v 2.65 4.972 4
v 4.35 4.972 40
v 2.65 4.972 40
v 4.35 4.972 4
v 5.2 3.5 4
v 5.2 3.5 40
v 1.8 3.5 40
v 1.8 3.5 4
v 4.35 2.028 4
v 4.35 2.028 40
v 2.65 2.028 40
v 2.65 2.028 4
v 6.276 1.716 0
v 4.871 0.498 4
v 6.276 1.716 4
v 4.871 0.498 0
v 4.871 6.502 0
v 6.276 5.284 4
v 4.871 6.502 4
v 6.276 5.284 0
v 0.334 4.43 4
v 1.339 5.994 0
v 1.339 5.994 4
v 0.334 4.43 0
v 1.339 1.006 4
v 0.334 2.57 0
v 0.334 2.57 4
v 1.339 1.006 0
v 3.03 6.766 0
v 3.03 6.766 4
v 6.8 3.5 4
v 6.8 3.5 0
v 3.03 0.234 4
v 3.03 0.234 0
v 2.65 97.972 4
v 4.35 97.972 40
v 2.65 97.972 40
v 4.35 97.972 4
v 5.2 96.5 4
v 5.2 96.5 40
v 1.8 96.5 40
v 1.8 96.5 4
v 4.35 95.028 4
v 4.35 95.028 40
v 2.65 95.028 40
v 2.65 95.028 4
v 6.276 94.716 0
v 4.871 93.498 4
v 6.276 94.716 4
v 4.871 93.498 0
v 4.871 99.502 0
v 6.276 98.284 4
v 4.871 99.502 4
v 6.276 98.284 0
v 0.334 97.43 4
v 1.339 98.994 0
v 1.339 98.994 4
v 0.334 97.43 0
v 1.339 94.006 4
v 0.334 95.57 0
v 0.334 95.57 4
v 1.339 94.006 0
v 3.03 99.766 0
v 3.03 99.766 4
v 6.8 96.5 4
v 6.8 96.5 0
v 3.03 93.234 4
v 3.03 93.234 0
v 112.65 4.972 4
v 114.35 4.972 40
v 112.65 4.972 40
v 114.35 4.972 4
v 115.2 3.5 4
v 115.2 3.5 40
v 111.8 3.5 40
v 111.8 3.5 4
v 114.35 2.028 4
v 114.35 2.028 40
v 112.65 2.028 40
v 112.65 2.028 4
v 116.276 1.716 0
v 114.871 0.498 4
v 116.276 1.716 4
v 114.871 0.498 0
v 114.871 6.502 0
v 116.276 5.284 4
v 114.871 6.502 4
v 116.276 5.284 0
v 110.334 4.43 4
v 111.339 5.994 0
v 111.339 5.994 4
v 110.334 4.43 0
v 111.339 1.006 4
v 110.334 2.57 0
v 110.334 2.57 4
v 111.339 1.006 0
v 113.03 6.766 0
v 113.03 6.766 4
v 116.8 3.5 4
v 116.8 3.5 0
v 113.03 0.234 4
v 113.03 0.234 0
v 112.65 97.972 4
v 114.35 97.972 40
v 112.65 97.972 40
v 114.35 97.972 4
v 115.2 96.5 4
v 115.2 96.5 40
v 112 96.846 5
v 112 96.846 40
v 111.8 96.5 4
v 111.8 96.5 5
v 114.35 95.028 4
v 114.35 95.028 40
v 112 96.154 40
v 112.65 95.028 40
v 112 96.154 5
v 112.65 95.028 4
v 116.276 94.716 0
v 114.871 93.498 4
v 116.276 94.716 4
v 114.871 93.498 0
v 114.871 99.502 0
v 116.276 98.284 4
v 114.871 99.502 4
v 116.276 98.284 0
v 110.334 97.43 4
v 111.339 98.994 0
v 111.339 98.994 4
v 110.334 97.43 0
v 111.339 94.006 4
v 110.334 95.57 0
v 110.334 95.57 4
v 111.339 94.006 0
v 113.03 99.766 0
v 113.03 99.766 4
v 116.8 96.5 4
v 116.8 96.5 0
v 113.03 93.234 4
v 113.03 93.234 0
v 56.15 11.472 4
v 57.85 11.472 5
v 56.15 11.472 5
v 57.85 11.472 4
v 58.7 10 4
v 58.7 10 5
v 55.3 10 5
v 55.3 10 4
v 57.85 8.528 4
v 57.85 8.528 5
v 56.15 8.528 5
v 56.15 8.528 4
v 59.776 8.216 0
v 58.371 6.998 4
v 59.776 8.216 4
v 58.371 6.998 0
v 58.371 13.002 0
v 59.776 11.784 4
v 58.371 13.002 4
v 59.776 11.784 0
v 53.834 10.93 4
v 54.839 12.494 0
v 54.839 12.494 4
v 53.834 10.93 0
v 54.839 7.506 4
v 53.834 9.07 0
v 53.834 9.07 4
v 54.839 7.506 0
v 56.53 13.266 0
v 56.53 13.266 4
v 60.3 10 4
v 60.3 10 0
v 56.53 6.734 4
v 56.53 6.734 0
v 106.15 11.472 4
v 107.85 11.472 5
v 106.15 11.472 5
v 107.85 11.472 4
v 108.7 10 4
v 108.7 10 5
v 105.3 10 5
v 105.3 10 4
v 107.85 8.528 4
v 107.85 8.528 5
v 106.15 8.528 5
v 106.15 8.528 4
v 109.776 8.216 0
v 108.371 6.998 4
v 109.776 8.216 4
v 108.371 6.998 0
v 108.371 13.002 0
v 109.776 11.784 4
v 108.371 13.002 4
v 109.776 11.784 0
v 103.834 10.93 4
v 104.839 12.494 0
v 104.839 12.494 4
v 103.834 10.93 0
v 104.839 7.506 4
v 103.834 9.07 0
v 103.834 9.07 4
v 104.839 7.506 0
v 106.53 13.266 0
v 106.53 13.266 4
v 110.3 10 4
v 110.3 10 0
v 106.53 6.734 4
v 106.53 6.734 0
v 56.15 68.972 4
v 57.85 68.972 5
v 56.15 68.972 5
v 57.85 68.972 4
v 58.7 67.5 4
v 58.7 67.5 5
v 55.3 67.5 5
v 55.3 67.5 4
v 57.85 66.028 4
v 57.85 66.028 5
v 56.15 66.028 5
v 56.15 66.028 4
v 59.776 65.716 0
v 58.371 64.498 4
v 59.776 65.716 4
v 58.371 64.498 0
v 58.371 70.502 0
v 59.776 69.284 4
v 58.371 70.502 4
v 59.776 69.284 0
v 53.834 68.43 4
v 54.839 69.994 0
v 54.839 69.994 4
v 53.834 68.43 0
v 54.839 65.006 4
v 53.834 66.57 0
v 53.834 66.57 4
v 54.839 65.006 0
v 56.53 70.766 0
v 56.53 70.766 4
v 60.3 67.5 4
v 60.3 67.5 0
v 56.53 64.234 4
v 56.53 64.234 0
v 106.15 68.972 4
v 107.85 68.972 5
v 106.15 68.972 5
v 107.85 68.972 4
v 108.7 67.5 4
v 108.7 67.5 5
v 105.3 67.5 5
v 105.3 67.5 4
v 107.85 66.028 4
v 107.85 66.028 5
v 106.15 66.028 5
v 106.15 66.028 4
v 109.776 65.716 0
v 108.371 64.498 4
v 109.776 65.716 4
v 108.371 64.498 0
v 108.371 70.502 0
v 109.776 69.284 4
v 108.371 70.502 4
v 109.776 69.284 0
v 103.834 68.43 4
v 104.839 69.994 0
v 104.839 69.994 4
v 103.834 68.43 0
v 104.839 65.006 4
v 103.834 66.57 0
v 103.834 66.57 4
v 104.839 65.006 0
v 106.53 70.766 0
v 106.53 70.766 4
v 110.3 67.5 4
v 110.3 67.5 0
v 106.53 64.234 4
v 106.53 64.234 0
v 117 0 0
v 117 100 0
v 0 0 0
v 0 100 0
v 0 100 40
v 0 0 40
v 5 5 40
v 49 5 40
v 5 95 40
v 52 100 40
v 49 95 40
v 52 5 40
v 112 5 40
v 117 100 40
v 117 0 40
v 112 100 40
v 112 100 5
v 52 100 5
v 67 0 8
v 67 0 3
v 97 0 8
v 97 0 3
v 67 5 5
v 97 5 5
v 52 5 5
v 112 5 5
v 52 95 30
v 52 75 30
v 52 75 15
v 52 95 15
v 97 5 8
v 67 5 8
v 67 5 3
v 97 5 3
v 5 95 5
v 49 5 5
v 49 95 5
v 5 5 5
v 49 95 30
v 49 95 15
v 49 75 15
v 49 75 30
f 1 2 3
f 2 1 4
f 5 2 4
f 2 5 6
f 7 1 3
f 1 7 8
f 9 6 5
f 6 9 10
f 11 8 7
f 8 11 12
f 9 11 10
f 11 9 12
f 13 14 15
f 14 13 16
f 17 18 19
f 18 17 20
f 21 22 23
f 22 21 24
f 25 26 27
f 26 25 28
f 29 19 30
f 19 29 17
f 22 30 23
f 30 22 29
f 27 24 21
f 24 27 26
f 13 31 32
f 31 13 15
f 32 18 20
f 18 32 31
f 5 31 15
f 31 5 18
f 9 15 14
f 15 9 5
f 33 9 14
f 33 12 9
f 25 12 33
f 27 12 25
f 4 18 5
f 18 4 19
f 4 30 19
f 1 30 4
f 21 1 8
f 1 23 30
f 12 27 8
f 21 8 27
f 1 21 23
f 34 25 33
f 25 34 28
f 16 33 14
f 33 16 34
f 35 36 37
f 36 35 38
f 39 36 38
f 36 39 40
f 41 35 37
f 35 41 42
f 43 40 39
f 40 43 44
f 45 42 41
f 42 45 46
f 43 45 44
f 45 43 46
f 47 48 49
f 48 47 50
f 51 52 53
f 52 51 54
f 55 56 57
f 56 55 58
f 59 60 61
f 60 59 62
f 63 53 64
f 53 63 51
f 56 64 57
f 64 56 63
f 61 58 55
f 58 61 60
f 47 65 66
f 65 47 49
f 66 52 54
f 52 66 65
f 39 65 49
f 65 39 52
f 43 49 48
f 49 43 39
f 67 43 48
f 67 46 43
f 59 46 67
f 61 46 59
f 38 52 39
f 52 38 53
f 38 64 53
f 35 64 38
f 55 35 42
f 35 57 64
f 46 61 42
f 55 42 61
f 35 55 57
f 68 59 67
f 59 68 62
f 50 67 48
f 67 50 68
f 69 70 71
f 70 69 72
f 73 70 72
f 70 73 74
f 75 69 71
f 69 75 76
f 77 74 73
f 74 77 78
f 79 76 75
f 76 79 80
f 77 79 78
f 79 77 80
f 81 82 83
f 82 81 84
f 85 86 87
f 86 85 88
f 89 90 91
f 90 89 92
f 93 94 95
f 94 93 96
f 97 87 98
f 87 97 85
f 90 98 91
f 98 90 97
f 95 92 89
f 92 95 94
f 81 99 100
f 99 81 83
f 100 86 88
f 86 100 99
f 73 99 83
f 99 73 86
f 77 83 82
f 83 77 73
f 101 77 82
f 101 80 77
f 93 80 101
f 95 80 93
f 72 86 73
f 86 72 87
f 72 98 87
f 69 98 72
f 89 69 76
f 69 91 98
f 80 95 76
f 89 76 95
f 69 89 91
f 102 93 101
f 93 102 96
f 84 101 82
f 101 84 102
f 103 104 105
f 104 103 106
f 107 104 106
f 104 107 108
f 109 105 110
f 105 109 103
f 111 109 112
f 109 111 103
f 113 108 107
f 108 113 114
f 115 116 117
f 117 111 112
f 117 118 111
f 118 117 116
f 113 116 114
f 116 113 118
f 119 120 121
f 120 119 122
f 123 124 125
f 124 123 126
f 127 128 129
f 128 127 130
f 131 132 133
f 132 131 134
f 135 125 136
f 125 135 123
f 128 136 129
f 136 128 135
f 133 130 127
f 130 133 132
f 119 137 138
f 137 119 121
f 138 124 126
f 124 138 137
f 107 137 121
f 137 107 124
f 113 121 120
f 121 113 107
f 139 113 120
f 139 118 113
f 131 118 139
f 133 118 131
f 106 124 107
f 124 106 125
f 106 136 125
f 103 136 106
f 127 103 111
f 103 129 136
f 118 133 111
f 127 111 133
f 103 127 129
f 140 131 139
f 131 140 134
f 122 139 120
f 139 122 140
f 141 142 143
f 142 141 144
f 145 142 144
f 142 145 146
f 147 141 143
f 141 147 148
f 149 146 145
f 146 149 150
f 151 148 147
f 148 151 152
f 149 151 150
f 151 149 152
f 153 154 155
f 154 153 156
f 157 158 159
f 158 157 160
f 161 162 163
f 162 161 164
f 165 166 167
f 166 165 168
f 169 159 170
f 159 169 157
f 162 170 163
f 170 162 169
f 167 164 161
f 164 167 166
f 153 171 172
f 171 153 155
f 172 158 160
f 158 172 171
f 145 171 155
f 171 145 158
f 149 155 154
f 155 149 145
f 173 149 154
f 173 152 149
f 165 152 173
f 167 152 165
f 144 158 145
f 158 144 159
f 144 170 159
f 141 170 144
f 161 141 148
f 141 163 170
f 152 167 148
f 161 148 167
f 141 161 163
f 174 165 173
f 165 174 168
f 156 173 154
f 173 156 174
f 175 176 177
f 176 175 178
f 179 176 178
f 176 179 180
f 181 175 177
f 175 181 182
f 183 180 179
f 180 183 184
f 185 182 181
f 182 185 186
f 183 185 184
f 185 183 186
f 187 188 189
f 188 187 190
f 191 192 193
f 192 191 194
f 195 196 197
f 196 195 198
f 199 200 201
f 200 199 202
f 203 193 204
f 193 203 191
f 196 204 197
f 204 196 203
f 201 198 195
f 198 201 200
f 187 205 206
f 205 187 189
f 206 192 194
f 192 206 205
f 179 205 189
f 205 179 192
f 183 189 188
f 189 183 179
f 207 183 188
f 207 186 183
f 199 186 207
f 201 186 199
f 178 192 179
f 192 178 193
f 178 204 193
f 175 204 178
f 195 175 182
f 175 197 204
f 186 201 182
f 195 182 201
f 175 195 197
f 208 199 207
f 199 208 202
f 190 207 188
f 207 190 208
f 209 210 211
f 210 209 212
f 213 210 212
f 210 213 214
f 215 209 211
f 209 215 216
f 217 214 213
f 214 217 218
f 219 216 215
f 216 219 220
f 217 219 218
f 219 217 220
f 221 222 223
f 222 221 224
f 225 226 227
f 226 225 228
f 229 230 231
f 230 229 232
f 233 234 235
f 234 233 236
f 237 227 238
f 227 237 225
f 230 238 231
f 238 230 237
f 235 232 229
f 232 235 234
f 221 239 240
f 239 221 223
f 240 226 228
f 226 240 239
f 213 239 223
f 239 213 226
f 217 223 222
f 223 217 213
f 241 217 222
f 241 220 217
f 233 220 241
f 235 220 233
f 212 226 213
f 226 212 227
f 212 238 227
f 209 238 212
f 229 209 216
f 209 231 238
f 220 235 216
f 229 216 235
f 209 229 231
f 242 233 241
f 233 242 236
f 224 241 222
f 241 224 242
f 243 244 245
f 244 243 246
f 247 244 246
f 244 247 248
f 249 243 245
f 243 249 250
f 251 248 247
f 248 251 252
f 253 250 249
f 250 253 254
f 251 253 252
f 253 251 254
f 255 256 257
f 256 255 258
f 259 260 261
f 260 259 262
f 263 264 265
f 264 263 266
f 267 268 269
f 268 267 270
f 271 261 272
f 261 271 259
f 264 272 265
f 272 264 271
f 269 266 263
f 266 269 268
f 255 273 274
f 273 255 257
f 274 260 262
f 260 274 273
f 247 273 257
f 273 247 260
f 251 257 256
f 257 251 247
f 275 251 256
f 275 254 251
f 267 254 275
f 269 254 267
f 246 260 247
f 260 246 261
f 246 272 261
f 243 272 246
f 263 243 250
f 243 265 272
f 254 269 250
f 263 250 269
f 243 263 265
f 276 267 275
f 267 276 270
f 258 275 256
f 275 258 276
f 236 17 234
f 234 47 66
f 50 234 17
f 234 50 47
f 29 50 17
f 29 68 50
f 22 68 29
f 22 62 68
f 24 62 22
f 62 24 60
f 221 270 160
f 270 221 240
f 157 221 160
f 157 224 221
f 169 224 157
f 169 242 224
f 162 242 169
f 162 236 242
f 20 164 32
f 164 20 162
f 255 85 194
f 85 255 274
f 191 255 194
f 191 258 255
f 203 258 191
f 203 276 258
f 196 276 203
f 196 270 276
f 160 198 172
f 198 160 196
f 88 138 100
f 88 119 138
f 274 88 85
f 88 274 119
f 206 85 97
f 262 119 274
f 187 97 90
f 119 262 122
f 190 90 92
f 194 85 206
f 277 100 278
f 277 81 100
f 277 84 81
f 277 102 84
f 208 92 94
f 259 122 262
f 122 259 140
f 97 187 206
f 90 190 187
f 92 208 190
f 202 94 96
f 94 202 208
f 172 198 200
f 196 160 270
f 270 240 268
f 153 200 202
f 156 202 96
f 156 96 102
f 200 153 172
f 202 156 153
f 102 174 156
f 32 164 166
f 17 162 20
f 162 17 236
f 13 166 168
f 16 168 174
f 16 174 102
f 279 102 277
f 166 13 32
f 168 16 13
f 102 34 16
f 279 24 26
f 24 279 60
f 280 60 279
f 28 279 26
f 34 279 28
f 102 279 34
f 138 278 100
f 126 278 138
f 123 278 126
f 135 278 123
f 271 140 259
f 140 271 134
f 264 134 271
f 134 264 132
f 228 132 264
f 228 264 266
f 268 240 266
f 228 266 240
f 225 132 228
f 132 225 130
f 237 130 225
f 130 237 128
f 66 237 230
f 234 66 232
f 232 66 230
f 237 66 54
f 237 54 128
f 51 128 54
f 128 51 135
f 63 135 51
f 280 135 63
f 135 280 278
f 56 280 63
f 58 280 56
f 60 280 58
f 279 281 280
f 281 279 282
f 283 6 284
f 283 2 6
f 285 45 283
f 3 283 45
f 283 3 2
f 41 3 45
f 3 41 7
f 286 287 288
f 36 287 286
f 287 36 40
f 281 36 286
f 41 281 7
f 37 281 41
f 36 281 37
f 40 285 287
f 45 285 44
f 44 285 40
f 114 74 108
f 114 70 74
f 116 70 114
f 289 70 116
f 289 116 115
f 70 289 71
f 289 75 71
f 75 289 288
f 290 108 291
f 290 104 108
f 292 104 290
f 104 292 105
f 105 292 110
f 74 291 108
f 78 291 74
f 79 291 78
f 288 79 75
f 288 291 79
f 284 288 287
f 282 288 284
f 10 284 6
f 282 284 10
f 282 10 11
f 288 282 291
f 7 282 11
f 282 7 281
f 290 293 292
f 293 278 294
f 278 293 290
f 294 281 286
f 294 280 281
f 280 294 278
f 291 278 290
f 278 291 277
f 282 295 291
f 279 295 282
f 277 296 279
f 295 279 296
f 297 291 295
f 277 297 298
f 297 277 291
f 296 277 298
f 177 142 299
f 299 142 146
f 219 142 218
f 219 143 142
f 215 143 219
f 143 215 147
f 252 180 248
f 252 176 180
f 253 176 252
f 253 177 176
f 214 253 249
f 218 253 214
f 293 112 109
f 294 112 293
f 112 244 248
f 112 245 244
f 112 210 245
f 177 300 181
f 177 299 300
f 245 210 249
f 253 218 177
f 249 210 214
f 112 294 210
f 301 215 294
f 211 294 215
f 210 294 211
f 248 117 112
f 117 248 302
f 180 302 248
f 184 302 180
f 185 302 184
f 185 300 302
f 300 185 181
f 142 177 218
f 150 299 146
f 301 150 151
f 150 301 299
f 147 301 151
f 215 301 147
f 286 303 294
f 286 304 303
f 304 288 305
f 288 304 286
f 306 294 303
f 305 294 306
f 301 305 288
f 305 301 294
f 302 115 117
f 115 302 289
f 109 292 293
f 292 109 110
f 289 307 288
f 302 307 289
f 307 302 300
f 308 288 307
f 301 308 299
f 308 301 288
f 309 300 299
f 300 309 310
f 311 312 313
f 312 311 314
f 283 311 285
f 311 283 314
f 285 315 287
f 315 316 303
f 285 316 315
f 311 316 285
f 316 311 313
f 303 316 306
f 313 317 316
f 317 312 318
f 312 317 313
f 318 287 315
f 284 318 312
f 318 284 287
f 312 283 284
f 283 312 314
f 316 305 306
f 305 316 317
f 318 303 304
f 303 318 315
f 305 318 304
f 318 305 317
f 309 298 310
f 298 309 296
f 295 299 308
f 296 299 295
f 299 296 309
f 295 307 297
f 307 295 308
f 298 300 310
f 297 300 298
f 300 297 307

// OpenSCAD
module screw_m3() {
        union() {
            linear_extrude(45) {
                circle(r=1.7);
            }
            linear_extrude(6) {
                circle(r=3.3);
            }
        }
}

difference() {
    linear_extrude(40) square([117,100]);
    translate([52,5,5]) linear_extrude(35.6) square([60,95]);
    translate([5,5,5]) linear_extrude(35.6) square([44,90]);
    translate([49,75,15]) linear_extrude(15) square([3,20]);
    translate([67,0,3]) linear_extrude(5) square([30,5]);
    translate([3.5,3.5,-2]) screw_m3();
    translate([3.5,96.5,-2]) screw_m3();
    translate([113.5,3.5,-2]) screw_m3();
    translate([113.5,96.5,-2]) screw_m3();
    translate([57,10,-2]) screw_m3();
    translate([107,10,-2]) screw_m3();
    translate([57,67.5,-2]) screw_m3();
    translate([107,67.5,-2]) screw_m3();
}
